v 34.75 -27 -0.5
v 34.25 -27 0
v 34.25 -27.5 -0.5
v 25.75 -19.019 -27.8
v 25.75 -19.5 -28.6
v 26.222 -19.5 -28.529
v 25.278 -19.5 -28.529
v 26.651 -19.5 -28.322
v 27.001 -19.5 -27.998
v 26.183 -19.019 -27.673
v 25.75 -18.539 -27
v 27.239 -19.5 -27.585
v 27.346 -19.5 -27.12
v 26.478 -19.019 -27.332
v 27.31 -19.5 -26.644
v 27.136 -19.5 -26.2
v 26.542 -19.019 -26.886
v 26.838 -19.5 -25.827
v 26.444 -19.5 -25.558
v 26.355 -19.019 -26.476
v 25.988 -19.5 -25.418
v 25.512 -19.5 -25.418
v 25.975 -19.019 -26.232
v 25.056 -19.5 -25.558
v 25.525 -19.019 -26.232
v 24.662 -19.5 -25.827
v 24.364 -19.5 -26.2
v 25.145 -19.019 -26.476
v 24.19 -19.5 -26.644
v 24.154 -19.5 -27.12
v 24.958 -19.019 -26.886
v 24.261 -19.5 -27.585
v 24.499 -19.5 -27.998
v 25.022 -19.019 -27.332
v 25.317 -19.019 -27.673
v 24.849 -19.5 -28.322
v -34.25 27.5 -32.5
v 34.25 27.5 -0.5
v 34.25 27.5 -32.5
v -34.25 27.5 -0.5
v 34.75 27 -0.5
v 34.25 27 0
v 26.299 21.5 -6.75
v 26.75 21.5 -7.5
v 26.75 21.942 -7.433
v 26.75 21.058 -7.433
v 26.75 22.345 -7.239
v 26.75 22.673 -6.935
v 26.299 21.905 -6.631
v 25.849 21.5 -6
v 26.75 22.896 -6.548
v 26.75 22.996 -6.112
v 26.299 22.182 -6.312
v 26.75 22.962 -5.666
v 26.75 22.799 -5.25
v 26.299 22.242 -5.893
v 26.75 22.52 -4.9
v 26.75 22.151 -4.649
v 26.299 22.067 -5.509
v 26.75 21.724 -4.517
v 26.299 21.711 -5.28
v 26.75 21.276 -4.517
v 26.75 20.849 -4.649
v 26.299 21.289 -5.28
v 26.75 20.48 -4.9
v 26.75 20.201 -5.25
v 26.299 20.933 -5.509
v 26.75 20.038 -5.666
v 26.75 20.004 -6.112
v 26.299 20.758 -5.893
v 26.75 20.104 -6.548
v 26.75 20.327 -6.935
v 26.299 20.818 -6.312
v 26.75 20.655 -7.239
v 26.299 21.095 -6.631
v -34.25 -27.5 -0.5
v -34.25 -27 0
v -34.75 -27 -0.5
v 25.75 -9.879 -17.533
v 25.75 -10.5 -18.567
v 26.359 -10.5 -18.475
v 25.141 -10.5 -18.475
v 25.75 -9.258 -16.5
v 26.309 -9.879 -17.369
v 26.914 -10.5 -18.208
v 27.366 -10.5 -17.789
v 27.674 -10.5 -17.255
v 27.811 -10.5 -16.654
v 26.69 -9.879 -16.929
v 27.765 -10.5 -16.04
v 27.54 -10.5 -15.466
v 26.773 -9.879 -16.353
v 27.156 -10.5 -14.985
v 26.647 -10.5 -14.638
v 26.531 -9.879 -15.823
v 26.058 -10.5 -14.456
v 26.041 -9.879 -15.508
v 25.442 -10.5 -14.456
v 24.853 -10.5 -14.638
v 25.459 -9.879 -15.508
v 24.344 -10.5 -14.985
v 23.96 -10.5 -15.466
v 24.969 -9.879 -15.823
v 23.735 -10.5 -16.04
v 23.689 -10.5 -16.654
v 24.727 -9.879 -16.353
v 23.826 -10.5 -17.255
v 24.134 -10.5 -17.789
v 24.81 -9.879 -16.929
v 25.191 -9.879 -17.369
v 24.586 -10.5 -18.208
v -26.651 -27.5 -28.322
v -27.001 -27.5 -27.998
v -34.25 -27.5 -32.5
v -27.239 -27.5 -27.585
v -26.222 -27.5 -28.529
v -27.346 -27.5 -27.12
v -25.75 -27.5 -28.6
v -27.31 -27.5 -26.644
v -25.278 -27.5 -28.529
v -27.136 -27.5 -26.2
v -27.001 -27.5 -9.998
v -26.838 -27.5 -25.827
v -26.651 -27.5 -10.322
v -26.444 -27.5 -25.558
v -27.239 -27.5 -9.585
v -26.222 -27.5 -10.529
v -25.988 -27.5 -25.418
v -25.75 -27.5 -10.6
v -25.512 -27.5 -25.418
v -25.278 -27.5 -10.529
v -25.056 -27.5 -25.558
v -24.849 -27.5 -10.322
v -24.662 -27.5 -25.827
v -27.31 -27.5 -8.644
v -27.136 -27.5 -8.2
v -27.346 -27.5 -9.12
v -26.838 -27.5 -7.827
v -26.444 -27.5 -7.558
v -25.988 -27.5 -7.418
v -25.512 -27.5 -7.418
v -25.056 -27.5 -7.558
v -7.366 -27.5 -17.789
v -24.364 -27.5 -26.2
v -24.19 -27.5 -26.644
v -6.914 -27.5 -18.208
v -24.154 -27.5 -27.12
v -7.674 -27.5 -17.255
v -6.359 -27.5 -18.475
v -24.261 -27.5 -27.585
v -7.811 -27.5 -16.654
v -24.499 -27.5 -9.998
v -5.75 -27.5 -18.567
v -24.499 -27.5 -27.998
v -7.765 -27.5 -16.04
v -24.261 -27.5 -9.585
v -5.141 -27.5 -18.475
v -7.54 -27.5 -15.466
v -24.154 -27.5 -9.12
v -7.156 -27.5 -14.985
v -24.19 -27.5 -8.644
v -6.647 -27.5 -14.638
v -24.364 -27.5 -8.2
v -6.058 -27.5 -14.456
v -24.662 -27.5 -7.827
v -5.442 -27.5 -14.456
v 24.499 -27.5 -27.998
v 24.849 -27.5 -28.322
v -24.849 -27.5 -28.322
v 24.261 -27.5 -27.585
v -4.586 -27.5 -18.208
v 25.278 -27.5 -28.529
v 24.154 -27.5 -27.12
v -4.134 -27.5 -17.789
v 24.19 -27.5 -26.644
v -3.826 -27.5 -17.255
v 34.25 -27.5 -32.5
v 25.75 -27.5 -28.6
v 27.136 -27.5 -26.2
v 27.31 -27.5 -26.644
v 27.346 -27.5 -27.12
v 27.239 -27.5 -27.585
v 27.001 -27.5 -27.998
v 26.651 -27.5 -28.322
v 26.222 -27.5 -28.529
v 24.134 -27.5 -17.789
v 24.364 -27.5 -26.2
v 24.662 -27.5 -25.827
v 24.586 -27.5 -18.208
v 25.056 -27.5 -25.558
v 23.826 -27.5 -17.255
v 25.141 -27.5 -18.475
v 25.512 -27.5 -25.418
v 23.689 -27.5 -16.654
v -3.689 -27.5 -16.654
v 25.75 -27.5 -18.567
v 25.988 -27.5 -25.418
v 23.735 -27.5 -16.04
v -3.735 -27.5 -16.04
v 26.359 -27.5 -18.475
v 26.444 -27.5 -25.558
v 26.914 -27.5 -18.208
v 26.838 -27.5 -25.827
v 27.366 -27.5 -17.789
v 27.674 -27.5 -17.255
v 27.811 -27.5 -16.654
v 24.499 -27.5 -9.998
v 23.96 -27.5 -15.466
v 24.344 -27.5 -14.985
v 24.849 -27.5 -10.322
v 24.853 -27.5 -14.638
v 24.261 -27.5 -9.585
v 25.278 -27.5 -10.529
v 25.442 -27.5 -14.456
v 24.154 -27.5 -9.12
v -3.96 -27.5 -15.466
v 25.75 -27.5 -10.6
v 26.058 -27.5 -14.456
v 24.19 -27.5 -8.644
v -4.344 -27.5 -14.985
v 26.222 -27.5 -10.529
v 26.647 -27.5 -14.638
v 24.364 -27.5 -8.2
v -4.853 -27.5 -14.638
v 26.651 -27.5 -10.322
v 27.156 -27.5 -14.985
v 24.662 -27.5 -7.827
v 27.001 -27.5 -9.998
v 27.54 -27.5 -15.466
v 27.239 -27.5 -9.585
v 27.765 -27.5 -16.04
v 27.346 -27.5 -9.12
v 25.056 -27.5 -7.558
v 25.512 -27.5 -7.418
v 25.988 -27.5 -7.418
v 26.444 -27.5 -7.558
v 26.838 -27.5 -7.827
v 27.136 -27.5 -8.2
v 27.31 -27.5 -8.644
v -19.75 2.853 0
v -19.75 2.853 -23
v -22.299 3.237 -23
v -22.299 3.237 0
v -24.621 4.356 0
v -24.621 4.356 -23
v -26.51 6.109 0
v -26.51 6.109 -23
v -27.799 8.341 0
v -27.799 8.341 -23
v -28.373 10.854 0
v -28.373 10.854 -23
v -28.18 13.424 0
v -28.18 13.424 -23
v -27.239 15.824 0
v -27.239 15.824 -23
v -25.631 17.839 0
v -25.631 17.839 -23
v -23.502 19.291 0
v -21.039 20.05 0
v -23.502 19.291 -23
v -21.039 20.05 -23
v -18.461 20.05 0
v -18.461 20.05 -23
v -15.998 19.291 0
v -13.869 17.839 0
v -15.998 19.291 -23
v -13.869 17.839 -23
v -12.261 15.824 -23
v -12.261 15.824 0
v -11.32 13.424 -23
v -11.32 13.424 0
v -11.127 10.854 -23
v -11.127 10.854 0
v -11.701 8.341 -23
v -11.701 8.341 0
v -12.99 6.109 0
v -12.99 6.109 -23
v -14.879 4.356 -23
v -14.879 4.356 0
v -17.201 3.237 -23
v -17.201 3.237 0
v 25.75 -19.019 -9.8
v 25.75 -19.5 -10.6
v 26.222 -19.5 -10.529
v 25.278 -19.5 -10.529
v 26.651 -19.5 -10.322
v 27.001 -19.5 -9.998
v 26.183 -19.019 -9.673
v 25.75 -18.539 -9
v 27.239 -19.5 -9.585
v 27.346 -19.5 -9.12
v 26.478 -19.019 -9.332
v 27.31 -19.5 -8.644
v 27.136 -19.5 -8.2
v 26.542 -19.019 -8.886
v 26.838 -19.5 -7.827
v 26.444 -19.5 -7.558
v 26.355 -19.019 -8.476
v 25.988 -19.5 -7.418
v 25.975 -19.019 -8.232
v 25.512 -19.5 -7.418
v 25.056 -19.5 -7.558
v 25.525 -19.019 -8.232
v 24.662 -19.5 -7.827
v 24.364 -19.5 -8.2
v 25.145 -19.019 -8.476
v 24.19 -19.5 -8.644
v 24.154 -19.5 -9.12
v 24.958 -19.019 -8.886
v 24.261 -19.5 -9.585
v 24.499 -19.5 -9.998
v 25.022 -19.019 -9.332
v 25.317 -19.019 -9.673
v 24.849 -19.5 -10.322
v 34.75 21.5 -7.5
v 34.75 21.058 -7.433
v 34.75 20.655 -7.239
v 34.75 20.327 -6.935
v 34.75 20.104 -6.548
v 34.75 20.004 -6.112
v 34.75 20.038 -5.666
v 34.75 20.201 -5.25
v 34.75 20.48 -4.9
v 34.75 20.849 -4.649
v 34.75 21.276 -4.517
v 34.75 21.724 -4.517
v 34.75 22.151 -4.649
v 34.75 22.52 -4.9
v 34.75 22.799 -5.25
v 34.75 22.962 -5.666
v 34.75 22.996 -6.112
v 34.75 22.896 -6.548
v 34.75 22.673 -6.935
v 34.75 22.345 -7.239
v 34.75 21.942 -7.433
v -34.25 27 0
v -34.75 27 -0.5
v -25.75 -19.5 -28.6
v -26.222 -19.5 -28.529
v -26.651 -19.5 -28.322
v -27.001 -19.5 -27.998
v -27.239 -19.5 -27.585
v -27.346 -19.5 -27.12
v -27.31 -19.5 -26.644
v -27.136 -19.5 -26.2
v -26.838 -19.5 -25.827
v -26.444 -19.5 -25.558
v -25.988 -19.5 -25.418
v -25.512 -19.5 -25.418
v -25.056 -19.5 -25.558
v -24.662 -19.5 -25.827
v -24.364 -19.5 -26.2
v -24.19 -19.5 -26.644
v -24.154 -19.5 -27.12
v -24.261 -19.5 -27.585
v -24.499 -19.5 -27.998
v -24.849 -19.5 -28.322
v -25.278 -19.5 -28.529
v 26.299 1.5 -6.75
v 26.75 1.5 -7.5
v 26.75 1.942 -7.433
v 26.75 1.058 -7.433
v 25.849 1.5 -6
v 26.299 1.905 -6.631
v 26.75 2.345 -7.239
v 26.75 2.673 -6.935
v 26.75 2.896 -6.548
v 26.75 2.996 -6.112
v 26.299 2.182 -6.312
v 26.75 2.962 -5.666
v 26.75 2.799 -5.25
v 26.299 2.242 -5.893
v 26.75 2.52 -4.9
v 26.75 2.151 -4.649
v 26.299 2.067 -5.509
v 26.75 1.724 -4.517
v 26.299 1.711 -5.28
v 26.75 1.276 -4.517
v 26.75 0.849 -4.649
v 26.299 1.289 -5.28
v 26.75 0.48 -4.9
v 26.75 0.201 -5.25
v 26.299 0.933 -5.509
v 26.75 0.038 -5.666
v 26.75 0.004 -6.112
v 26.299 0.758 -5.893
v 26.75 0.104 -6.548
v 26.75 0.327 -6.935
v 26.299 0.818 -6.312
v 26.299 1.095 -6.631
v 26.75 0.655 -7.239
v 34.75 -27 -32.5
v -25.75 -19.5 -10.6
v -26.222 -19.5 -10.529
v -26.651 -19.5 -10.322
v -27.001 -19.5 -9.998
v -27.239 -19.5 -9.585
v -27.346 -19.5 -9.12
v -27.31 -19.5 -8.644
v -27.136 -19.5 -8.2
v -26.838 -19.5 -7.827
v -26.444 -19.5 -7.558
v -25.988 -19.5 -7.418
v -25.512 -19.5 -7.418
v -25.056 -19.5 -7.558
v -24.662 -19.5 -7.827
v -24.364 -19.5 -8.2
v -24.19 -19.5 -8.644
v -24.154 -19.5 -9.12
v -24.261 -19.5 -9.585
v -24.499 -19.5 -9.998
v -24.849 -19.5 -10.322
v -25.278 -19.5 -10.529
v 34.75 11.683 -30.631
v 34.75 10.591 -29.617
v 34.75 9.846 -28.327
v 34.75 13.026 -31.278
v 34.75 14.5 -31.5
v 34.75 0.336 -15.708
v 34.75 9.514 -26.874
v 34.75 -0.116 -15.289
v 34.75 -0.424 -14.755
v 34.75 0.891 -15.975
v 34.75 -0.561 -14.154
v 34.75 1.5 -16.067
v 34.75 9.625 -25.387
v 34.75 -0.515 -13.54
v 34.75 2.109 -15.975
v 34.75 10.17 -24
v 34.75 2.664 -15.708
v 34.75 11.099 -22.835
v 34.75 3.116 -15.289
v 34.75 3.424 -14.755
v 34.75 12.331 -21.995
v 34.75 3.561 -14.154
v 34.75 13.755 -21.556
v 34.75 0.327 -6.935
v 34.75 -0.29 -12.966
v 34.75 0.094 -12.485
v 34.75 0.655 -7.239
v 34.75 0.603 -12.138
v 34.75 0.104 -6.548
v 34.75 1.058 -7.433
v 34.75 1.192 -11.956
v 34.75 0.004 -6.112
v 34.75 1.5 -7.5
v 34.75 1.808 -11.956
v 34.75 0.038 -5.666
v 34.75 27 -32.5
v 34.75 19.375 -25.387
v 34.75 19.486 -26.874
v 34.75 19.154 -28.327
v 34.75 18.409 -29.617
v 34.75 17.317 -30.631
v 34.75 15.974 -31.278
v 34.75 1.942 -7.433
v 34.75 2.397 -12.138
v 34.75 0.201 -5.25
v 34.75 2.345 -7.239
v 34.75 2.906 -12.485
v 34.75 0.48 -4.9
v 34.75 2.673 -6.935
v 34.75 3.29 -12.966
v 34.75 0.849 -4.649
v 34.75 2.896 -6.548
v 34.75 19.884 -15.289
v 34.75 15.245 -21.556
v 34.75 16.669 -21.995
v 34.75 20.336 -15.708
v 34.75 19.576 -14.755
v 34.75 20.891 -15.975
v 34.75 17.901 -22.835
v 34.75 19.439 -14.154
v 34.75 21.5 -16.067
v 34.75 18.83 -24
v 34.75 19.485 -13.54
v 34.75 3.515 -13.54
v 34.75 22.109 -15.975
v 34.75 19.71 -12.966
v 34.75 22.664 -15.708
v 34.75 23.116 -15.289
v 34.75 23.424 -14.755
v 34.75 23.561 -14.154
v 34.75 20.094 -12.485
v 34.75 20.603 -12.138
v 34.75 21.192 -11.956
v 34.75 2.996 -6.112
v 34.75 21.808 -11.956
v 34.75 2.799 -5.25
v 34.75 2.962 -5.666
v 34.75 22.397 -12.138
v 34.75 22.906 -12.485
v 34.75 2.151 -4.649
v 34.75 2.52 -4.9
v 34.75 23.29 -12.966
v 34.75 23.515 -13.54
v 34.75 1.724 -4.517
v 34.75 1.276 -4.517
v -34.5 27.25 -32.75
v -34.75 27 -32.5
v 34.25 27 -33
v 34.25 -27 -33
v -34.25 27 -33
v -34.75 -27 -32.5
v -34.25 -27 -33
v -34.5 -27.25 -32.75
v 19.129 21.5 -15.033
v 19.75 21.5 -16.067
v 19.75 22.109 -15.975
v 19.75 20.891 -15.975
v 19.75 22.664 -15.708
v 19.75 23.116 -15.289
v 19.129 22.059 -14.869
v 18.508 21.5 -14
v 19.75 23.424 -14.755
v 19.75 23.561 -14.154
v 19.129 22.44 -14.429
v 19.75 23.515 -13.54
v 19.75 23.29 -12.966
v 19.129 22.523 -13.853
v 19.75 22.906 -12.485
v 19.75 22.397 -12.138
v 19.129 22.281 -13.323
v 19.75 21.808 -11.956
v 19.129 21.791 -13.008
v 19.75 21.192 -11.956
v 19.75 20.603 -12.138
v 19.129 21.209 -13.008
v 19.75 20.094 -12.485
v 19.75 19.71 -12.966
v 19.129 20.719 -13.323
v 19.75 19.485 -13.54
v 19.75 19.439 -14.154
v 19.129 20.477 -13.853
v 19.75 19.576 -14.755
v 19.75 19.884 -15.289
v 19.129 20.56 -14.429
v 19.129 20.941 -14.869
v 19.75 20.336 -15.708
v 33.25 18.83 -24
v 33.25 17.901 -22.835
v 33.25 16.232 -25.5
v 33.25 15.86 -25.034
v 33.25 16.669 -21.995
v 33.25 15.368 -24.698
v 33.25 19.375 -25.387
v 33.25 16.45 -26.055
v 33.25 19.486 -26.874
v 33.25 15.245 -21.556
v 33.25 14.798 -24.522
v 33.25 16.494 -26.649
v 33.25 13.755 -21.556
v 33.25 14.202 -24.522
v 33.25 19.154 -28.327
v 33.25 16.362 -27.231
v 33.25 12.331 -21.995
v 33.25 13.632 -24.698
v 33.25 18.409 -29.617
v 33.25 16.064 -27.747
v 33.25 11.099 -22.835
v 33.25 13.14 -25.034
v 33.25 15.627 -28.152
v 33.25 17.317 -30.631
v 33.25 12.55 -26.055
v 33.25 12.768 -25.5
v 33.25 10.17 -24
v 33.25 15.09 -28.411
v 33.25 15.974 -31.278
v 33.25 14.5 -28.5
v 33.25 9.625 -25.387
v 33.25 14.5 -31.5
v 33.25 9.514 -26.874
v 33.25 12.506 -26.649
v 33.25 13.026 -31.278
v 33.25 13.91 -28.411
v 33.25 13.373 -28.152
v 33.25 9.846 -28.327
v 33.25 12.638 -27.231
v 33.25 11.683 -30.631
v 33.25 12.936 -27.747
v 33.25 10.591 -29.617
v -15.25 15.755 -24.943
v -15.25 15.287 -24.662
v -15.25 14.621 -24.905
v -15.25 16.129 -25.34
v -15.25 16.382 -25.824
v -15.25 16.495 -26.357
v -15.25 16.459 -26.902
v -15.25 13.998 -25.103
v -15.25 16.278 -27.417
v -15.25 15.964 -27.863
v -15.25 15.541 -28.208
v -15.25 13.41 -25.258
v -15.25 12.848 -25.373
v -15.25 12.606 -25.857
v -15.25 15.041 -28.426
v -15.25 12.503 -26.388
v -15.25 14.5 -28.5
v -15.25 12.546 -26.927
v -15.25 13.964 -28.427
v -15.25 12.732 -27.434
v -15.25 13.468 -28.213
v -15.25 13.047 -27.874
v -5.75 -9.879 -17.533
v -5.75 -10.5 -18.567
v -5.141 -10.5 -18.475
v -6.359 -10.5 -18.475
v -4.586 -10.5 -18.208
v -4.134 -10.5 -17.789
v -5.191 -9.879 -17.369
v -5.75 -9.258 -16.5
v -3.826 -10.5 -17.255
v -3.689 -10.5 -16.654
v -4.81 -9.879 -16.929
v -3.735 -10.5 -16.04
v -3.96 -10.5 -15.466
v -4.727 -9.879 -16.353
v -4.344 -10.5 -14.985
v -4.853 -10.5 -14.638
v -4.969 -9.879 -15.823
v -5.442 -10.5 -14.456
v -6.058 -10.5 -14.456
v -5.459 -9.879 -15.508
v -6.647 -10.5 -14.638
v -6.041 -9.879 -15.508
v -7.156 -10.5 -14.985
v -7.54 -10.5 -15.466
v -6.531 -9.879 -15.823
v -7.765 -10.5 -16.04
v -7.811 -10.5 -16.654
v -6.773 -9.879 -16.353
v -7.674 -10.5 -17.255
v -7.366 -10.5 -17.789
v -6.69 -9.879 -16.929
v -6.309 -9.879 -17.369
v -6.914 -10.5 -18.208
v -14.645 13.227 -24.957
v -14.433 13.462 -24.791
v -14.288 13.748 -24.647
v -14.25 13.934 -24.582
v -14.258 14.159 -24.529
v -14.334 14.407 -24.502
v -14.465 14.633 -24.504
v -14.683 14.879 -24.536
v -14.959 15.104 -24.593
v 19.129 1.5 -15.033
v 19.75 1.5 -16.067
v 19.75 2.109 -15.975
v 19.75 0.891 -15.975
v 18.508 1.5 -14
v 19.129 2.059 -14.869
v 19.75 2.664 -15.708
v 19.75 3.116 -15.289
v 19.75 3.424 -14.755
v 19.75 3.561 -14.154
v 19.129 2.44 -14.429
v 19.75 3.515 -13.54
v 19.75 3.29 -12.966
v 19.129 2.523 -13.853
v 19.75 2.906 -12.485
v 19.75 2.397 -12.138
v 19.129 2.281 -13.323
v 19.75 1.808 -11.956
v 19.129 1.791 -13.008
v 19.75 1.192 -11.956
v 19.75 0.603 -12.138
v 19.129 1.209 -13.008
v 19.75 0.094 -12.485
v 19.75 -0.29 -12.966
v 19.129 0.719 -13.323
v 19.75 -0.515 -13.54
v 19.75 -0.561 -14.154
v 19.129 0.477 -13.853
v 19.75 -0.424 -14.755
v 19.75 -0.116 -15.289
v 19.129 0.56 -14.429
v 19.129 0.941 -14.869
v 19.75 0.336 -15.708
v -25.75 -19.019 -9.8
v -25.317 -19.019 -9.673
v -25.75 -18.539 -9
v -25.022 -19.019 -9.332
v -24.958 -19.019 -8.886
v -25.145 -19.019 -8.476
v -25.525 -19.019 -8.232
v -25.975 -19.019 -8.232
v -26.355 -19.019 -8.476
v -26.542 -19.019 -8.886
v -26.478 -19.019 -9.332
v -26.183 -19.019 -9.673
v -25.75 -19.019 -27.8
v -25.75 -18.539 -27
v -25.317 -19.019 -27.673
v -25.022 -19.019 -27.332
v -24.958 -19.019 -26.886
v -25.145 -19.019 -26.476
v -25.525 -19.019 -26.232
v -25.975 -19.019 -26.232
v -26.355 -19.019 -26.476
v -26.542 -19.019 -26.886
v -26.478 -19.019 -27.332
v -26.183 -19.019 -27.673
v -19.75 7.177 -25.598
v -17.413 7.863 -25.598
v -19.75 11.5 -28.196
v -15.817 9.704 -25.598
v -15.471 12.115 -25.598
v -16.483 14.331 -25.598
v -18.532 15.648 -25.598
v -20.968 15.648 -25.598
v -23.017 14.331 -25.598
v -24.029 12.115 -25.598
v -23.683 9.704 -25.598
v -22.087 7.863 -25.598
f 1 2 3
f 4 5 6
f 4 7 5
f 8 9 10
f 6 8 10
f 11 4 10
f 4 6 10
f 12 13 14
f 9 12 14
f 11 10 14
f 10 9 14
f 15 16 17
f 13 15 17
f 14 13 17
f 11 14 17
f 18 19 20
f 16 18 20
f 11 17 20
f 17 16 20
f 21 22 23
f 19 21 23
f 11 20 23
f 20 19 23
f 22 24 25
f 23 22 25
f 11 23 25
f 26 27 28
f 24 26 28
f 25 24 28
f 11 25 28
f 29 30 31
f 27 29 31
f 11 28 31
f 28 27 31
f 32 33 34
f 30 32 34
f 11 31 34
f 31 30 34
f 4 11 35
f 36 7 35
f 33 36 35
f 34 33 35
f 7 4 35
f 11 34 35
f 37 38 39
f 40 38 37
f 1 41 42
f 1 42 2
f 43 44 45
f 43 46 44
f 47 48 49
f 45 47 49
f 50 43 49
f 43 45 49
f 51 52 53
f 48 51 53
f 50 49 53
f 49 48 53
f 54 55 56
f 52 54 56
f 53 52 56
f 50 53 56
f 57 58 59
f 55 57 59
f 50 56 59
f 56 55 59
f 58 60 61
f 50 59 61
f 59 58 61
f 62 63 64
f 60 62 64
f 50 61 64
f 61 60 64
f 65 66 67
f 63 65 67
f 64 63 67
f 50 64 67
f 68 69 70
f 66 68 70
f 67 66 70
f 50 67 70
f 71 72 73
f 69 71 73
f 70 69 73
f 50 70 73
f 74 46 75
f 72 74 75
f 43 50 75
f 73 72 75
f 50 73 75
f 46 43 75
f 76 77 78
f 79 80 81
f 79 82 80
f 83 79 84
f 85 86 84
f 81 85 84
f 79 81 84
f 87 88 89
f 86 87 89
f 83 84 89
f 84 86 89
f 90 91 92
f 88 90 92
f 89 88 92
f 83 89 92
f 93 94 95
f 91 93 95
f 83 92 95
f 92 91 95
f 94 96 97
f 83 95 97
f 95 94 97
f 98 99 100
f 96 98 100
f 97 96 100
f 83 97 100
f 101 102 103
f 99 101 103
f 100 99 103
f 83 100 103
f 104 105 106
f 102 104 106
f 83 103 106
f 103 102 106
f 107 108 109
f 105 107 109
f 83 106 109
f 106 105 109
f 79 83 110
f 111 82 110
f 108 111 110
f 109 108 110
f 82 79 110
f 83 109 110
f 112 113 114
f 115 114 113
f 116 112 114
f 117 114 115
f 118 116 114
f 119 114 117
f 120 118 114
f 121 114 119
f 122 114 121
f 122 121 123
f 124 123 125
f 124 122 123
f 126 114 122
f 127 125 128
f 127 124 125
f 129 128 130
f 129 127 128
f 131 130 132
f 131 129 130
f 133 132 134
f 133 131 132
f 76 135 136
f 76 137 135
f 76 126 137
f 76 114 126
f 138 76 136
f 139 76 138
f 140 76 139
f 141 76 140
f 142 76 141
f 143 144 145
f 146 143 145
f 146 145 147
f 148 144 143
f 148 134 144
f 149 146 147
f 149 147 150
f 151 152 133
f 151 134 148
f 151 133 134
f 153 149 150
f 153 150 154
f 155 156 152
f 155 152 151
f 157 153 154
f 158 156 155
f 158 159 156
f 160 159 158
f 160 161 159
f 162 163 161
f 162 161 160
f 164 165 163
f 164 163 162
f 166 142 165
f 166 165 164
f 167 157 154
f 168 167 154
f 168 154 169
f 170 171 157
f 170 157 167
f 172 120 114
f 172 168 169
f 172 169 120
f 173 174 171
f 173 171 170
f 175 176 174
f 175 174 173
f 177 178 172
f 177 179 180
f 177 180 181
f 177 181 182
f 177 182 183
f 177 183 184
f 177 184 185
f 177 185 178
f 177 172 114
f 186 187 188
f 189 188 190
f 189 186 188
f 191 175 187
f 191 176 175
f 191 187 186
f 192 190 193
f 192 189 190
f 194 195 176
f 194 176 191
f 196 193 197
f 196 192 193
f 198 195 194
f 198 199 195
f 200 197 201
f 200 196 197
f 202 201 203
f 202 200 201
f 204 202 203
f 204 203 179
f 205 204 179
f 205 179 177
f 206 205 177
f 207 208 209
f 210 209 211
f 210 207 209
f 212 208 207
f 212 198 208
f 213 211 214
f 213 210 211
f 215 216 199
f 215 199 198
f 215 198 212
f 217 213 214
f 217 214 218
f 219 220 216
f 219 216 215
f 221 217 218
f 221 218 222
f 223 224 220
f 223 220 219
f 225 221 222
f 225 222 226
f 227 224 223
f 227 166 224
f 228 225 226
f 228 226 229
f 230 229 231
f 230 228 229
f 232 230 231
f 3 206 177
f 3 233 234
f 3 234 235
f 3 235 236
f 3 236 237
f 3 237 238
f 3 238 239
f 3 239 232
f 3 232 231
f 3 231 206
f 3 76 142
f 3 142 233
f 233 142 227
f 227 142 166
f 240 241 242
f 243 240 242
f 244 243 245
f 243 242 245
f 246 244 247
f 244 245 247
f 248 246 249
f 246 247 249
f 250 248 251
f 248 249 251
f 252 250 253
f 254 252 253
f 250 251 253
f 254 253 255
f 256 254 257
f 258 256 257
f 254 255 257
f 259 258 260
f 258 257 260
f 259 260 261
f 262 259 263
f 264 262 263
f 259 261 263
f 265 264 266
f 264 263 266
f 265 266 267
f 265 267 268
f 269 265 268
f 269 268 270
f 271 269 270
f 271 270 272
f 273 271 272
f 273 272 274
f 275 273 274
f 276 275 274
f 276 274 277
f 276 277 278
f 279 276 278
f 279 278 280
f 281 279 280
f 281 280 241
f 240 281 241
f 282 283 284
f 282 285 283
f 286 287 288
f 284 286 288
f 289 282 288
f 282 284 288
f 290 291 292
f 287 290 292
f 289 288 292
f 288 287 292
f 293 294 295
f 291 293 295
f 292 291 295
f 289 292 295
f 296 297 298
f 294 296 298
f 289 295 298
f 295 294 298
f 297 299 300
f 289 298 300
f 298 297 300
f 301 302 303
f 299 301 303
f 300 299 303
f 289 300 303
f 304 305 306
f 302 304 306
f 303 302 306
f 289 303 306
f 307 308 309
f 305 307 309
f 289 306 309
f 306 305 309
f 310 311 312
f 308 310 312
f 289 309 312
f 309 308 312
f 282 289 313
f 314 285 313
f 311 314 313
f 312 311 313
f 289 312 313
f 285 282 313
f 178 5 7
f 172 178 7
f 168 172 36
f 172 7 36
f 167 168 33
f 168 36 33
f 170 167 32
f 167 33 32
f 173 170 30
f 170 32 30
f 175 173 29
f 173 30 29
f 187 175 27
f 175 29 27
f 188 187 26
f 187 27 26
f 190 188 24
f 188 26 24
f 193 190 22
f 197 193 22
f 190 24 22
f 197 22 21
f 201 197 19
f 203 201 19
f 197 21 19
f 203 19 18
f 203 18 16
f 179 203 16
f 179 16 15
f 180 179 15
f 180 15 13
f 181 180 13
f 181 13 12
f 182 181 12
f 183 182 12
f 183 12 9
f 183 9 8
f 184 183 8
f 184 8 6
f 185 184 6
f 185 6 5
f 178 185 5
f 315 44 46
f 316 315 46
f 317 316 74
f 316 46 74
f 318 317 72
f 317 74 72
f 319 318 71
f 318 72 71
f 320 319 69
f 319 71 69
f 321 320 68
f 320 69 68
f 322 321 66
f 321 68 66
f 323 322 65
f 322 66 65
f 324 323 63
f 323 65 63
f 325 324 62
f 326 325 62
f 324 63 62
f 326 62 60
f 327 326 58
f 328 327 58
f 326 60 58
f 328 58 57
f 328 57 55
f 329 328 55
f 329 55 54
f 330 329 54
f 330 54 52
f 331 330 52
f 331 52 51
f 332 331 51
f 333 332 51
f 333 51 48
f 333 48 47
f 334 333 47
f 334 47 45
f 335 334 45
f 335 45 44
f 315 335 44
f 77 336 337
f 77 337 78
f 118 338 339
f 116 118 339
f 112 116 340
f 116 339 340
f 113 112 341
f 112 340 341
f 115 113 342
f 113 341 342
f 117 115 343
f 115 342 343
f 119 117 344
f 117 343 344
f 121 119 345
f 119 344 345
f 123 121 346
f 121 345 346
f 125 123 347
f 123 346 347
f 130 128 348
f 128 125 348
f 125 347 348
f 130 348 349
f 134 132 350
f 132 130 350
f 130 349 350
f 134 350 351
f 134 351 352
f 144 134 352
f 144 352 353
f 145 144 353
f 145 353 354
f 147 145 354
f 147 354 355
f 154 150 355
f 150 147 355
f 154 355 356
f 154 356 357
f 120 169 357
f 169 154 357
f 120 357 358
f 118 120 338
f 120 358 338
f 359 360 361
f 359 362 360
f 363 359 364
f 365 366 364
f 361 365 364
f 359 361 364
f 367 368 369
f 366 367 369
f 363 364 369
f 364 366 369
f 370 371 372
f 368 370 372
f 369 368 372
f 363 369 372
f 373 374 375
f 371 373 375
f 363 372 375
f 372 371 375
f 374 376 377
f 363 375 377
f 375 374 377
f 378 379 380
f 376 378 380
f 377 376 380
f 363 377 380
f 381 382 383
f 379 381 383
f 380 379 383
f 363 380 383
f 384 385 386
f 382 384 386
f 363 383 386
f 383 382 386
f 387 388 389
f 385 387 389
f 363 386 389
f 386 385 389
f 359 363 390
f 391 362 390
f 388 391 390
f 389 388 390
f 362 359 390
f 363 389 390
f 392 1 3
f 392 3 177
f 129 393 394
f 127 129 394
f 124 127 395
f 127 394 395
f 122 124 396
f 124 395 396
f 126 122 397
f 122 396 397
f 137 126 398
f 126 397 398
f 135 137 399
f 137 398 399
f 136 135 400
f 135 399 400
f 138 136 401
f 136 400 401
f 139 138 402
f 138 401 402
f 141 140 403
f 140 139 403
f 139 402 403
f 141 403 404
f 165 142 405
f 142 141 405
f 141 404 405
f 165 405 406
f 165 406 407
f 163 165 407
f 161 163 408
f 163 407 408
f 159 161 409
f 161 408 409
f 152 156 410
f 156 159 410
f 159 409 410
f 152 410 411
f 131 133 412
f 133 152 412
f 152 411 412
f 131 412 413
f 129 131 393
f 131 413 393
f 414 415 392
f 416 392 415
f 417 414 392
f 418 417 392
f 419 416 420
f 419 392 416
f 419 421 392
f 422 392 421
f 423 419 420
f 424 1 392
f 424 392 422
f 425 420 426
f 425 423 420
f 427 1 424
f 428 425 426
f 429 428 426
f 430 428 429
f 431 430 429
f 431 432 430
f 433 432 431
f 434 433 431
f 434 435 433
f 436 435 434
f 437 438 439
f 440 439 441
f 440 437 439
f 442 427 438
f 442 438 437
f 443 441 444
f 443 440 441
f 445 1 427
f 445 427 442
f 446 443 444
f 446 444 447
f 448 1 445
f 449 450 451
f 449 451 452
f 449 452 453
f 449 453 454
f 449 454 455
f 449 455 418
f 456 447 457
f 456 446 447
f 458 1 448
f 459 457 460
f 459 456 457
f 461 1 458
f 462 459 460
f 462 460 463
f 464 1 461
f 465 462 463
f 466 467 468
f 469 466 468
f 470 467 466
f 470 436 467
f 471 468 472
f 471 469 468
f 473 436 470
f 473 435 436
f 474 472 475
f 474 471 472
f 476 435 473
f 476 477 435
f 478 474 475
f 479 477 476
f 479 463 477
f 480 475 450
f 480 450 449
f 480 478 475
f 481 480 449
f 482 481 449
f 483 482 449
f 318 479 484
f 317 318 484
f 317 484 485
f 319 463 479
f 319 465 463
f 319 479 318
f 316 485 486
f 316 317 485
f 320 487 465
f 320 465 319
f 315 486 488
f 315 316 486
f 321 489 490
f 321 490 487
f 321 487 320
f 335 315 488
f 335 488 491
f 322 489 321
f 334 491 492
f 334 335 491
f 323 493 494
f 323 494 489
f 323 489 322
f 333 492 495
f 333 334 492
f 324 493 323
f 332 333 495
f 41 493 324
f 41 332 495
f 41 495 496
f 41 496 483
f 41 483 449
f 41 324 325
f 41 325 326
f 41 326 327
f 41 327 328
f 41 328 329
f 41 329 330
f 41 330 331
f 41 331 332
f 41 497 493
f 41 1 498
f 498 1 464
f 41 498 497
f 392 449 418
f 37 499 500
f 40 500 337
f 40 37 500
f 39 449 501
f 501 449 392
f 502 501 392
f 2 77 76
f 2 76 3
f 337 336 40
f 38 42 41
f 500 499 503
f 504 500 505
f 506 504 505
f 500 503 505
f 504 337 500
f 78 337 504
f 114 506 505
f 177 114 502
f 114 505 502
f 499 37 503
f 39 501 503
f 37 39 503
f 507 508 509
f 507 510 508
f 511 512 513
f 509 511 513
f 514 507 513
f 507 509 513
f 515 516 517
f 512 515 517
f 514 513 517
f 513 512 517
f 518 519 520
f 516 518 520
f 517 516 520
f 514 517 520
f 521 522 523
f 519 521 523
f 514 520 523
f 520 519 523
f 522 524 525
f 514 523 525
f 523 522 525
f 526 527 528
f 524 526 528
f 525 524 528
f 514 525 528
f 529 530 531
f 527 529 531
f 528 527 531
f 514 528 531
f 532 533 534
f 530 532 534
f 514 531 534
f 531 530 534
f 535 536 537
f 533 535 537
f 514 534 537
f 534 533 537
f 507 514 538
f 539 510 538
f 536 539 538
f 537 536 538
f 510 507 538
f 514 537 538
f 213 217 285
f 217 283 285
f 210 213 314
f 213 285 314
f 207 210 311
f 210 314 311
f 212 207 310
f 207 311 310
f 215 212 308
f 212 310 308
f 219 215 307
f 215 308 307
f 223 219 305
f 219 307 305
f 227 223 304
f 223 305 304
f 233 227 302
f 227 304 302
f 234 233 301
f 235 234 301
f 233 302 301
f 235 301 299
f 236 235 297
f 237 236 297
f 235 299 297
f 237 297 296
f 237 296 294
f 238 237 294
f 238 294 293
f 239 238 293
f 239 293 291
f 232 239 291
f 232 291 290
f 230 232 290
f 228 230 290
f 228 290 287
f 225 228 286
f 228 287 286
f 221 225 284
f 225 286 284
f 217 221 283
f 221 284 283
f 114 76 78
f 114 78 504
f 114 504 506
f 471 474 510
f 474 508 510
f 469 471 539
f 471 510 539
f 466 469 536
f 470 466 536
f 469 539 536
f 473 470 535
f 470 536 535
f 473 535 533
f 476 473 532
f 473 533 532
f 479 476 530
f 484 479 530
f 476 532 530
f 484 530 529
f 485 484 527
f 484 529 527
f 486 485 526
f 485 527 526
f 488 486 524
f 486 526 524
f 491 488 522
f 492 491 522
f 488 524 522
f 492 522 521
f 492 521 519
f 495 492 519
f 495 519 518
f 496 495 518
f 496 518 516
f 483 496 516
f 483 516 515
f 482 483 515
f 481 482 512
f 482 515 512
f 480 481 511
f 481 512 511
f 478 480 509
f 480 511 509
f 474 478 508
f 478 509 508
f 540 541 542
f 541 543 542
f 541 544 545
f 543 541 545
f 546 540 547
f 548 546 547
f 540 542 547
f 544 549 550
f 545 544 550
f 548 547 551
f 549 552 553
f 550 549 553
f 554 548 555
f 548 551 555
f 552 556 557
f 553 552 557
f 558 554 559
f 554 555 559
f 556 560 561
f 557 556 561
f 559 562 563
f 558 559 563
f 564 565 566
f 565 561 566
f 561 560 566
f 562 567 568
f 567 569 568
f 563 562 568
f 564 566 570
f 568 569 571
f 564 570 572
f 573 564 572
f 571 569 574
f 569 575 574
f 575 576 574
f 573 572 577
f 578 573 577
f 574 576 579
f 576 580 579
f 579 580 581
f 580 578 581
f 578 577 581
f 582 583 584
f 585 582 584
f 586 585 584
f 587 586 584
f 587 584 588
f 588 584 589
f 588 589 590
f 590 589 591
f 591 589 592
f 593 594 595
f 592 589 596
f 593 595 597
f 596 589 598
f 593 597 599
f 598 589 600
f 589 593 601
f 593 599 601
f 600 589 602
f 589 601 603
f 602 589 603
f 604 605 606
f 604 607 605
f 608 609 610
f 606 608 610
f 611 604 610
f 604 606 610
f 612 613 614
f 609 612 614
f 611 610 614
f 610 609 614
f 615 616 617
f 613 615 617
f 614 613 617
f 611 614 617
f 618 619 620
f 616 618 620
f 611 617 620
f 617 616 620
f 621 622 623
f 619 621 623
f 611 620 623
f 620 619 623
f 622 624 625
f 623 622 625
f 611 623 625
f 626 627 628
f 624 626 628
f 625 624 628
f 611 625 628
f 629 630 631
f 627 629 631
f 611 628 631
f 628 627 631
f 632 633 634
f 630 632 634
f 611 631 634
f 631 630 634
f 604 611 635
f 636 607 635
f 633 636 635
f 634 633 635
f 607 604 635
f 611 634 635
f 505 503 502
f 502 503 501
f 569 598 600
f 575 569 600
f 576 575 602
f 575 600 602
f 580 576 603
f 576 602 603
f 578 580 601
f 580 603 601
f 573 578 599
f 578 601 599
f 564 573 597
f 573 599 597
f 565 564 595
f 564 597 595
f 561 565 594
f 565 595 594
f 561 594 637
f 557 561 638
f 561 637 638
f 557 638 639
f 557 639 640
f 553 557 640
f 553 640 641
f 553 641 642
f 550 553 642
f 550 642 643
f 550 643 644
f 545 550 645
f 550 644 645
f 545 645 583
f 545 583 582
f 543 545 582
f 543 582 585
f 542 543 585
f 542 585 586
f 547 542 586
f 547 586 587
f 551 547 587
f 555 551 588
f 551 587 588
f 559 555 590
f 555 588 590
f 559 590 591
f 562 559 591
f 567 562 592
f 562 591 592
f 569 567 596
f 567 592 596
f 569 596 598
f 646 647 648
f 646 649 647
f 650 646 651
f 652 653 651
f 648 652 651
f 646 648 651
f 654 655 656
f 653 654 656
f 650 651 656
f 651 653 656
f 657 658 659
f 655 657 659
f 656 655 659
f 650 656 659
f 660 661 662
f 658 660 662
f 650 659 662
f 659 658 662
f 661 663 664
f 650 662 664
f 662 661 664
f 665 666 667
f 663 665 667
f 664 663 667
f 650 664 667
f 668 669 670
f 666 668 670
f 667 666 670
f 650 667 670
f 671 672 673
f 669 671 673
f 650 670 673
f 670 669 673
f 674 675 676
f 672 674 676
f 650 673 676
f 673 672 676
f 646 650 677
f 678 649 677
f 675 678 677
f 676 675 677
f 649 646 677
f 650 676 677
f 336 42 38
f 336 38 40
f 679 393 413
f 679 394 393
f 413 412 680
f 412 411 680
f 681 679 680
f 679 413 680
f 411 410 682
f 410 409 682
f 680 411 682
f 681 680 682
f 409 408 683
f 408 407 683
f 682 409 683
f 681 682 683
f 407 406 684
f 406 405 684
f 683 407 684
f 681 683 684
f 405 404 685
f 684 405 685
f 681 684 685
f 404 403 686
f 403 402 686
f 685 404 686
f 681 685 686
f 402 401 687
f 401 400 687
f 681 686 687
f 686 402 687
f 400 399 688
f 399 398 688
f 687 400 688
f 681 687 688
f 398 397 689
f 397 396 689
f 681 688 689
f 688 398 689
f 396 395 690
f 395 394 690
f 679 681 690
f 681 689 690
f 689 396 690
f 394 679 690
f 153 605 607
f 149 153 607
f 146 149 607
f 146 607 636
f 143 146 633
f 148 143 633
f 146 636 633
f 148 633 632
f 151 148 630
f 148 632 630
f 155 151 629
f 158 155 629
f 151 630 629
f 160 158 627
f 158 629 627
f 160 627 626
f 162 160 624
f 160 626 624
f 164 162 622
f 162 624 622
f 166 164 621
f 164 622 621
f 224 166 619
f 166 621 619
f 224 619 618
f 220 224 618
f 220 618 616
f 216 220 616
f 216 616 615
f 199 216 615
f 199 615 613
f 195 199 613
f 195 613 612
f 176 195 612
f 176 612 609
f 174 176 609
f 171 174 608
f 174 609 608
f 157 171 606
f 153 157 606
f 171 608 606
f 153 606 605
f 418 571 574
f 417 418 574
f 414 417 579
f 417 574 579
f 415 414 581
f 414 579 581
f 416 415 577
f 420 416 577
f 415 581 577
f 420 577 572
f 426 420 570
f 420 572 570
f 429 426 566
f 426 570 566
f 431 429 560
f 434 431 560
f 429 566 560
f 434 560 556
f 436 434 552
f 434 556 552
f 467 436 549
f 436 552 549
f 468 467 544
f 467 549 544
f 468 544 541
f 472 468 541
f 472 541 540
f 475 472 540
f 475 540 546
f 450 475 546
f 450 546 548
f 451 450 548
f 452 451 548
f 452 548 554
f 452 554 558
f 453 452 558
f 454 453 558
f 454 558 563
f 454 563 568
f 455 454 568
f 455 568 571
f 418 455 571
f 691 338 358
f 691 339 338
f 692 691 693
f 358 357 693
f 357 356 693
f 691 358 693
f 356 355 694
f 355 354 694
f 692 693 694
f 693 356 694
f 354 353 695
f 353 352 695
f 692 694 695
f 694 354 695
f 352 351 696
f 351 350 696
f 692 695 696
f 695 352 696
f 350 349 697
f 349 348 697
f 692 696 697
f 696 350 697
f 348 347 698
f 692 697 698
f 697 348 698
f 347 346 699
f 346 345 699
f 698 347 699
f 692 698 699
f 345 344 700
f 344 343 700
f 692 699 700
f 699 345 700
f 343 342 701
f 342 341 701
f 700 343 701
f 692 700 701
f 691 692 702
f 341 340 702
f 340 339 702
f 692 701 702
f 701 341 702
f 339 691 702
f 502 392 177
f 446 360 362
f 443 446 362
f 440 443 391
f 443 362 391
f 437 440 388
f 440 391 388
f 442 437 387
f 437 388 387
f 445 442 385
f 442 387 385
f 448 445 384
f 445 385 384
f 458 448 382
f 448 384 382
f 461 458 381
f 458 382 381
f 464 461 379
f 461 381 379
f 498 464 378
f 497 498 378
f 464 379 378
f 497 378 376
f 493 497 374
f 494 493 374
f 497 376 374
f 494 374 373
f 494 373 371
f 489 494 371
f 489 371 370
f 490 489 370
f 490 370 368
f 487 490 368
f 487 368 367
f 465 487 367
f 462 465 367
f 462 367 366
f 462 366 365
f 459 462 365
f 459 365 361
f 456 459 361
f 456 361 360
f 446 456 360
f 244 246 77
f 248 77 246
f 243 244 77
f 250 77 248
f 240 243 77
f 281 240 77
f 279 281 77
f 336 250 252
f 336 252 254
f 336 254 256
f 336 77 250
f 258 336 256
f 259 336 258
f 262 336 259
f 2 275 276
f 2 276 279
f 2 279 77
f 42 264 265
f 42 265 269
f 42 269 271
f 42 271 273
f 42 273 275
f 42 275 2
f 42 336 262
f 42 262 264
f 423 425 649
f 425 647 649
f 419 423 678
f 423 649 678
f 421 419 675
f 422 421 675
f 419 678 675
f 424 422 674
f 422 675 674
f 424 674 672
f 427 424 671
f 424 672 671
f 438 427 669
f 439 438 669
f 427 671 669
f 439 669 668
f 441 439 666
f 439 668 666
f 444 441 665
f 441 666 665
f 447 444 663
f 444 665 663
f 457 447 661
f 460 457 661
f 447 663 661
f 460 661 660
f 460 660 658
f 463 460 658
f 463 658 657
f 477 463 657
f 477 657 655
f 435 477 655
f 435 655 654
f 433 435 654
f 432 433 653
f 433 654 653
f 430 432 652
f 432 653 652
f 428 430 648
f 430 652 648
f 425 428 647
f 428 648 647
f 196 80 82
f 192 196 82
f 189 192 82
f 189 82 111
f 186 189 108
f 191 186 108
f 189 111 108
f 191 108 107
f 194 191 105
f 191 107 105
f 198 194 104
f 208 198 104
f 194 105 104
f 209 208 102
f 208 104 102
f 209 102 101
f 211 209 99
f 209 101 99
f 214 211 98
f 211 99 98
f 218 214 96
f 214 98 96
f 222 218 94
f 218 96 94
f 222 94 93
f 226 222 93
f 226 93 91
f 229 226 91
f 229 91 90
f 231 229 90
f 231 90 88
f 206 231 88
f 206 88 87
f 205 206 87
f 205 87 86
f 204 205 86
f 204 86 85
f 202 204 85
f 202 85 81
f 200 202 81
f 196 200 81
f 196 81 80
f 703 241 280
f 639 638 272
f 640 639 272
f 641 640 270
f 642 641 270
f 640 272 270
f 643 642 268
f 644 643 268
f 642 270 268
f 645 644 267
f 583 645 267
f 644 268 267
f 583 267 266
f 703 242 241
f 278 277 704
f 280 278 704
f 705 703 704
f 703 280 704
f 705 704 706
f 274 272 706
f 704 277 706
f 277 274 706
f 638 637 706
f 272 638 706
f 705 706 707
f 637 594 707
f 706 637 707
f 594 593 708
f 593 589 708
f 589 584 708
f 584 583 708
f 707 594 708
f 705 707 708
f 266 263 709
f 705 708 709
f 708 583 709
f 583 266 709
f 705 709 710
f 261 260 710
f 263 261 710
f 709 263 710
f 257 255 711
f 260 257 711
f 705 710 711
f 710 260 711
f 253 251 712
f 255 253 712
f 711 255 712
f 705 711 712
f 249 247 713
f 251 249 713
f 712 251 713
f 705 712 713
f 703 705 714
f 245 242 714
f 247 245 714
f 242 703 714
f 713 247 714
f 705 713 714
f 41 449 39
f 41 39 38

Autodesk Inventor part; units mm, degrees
ref_plane "XZ Plane" through (0, 0, 0) normal (0, 1, 0) x (-1, 0, 0)
ref_plane "XY Plane" through (0, 0, 0) normal (0, 0, 1) x (1, 0, 0)
sketch "Skizze1" plane through (0, 0, 0) normal (0, 0, 1) x (1, 0, 0)
  line L0 (-34.75, -27.5) -> (34.75, -27.5)
  line L1 (34.75, -27.5) -> (34.75, 27.5)
  line L2 (34.75, 27.5) -> (-34.75, 27.5)
  line L3 (-34.75, 27.5) -> (-34.75, -27.5)
  line L4 (-34.75, -27.5) -> (34.75, 27.5) construction
  line L5 (34.75, -27.5) -> (-34.75, 27.5) construction
  point P0 (0, 0)
  dimension "d0" = 69.5
  dimension "d1" = 55
extrude "Extrusion1" add sketch "Skizze1" against normal blind 33
sketch "Skizze2" plane through (0, 0, 0) normal (0, 0, 1) x (1, 0, 0)
  line L0 (-34.75, 27.5) -> (-34.75, -27.5) projected
  line L1 (-34.75, -27.5) -> (34.75, -27.5) projected
  point P0 (0, 0)
  point P1 (-19.75, 11.5)
  dimension "d11" = 15
  dimension "d12" = 39
hole "Bohrung1" at (-19.75, 11.5, 0) direction (0, 0, -1) diameter 17.294 depth 23 tip angle 118 thread size "M20x2.5" class "6H" standard "ISO Metric profile"
sketch "Skizze4" plane through (34.75, -27.5, 0) normal (1, 0, 0) x (0, 0, -1)
  line L0 (0, 0) -> (33, 0) projected
  line L1 (33, 55) -> (33, 0) projected
  point P0 (0, 27.5)
  point P1 (6, 49)
  point P2 (14, 49)
  point P3 (6, 29)
  point P4 (14, 29)
  dimension "d21" = 29
  dimension "d22" = 20
  dimension "d23" = 27
  dimension "d24" = 27
  dimension "d85" = 8
hole "Bohrung3" at (34.75, 21.5, -14) at (34.75, 1.5, -14) direction (-1, 0, 0) diameter 4.134 depth 15 tip angle 118 thread size "M5x0.8" class "6H" standard "ISO Metric profile"
hole "Bohrung4" at (34.75, 21.5, -6) at (34.75, 1.5, -6) direction (-1, 0, 0) diameter 3 depth 8 tip angle 118
sketch "Skizze5" plane through (34.75, -27.5, 0) normal (1, 0, 0) x (0, 0, -1)
  line L0 (33, 55) -> (33, 0) projected
  line L1 (0, 0) -> (0, 55) projected
  line L2 (0, 42) -> (33, 42) construction
  line L3 (0, 55) -> (33, 55) projected
  point P0 (0, 27.5)
  point P1 (26.5, 42)
  point P2 (16.5, 42)
  dimension "d48" = 6.5
  dimension "d49" = 13
hole "Bohrung5" at (34.75, 14.5, -26.5) direction (-1, 0, 0) diameter 4 depth 50 counterbore diameter 10 counterbore depth 1.5
sketch "Skizze6" plane through (-34.75, -27.5, 0) normal (0, -1, 0) x (1, 0, 0)
  line L0 (69.5, -33) -> (0, -33) projected
  line L1 (69.5, 0) -> (69.5, -33) projected
  line L2 (69.5, -16.5) -> (0, -16.5) construction
  point P0 (34.75, 0)
  point P1 (60.5, -27)
  point P2 (60.5, -9)
  dimension "d57" = 6
  dimension "d58" = 18
  dimension "d59" = 9
  dimension "d60" = 9
hole "Bohrung6" at (25.75, -27.5, -27) at (25.75, -27.5, -9) direction (0, 1, 0) diameter 3.2 depth 8 tip angle 118
sketch "Skizze7" plane through (-34.75, -27.5, 0) normal (0, -1, 0) x (1, 0, 0)
  circle A0 centre (60.5, -27) radius 1.6 projected
  line L0 (69.5, 0) -> (69.5, -33) projected
  point P0 (34.75, 0)
  point P1 (60.5, -16.5)
  point P2 (69.5, -16.5)
hole "Bohrung7" at (25.75, -27.5, -16.5) direction (0, 1, 0) diameter 4.134 depth 17 tip angle 118 thread size "M5x0.8" class "6H" standard "ISO Metric profile"
ref_plane "Arbeitsebene1" through (0, 0, 0) normal (1, 0, 0) x (0, 1, 0)
mirror "Spiegeln1" about plane through (0, 0, 0) normal (1, 0, 0) of "Bohrung6"
sketch "Skizze8" plane through (-34.75, -27.5, 0) normal (0, -1, 0) x (1, 0, 0)
  line L0 (69.5, 0) -> (69.5, -33) projected
  line L1 (0, 0) -> (0, -33) projected
  line L2 (69.5, 0) -> (69.5, -33) projected
  line L3 (0, 0) -> (69.5, 0) projected
  point P0 (34.75, 0)
  point P1 (29, -16.5)
  point P2 (69.5, -16.5)
  point P3 (69.5, -16.5)
  dimension "d76" = 29
  dimension "d77" = 16.5
hole "Bohrung8" at (-5.75, -27.5, -16.5) direction (0, 1, 0) diameter 4.134 depth 17 tip angle 118 thread size "M5x0.8" class "6H" standard "ISO Metric profile"
chamfer "Fasen1" distance 0.5 angle 45 11 edges at (34.75, 0, 0) (0, 27.5, 0) (-34.75, 0, 0) (0, -27.5, 0) (34.75, -27.5, -16.5) (34.75, 0, -33) (34.75, 27.5, -16.5) (-34.75, 27.5, -16.5) (0, 27.5, -33) (0, -27.5, -33) (-34.75, -27.5, -16.5)
chamfer "Fasen2" distance 0.5 angle 45 1 edges at (-34.75, 0, -33)
equation "\"d24\" = d23"
equation "\"d60\" = d59"
properties part number "Steuerblock" material "Stahl, Legierung"
